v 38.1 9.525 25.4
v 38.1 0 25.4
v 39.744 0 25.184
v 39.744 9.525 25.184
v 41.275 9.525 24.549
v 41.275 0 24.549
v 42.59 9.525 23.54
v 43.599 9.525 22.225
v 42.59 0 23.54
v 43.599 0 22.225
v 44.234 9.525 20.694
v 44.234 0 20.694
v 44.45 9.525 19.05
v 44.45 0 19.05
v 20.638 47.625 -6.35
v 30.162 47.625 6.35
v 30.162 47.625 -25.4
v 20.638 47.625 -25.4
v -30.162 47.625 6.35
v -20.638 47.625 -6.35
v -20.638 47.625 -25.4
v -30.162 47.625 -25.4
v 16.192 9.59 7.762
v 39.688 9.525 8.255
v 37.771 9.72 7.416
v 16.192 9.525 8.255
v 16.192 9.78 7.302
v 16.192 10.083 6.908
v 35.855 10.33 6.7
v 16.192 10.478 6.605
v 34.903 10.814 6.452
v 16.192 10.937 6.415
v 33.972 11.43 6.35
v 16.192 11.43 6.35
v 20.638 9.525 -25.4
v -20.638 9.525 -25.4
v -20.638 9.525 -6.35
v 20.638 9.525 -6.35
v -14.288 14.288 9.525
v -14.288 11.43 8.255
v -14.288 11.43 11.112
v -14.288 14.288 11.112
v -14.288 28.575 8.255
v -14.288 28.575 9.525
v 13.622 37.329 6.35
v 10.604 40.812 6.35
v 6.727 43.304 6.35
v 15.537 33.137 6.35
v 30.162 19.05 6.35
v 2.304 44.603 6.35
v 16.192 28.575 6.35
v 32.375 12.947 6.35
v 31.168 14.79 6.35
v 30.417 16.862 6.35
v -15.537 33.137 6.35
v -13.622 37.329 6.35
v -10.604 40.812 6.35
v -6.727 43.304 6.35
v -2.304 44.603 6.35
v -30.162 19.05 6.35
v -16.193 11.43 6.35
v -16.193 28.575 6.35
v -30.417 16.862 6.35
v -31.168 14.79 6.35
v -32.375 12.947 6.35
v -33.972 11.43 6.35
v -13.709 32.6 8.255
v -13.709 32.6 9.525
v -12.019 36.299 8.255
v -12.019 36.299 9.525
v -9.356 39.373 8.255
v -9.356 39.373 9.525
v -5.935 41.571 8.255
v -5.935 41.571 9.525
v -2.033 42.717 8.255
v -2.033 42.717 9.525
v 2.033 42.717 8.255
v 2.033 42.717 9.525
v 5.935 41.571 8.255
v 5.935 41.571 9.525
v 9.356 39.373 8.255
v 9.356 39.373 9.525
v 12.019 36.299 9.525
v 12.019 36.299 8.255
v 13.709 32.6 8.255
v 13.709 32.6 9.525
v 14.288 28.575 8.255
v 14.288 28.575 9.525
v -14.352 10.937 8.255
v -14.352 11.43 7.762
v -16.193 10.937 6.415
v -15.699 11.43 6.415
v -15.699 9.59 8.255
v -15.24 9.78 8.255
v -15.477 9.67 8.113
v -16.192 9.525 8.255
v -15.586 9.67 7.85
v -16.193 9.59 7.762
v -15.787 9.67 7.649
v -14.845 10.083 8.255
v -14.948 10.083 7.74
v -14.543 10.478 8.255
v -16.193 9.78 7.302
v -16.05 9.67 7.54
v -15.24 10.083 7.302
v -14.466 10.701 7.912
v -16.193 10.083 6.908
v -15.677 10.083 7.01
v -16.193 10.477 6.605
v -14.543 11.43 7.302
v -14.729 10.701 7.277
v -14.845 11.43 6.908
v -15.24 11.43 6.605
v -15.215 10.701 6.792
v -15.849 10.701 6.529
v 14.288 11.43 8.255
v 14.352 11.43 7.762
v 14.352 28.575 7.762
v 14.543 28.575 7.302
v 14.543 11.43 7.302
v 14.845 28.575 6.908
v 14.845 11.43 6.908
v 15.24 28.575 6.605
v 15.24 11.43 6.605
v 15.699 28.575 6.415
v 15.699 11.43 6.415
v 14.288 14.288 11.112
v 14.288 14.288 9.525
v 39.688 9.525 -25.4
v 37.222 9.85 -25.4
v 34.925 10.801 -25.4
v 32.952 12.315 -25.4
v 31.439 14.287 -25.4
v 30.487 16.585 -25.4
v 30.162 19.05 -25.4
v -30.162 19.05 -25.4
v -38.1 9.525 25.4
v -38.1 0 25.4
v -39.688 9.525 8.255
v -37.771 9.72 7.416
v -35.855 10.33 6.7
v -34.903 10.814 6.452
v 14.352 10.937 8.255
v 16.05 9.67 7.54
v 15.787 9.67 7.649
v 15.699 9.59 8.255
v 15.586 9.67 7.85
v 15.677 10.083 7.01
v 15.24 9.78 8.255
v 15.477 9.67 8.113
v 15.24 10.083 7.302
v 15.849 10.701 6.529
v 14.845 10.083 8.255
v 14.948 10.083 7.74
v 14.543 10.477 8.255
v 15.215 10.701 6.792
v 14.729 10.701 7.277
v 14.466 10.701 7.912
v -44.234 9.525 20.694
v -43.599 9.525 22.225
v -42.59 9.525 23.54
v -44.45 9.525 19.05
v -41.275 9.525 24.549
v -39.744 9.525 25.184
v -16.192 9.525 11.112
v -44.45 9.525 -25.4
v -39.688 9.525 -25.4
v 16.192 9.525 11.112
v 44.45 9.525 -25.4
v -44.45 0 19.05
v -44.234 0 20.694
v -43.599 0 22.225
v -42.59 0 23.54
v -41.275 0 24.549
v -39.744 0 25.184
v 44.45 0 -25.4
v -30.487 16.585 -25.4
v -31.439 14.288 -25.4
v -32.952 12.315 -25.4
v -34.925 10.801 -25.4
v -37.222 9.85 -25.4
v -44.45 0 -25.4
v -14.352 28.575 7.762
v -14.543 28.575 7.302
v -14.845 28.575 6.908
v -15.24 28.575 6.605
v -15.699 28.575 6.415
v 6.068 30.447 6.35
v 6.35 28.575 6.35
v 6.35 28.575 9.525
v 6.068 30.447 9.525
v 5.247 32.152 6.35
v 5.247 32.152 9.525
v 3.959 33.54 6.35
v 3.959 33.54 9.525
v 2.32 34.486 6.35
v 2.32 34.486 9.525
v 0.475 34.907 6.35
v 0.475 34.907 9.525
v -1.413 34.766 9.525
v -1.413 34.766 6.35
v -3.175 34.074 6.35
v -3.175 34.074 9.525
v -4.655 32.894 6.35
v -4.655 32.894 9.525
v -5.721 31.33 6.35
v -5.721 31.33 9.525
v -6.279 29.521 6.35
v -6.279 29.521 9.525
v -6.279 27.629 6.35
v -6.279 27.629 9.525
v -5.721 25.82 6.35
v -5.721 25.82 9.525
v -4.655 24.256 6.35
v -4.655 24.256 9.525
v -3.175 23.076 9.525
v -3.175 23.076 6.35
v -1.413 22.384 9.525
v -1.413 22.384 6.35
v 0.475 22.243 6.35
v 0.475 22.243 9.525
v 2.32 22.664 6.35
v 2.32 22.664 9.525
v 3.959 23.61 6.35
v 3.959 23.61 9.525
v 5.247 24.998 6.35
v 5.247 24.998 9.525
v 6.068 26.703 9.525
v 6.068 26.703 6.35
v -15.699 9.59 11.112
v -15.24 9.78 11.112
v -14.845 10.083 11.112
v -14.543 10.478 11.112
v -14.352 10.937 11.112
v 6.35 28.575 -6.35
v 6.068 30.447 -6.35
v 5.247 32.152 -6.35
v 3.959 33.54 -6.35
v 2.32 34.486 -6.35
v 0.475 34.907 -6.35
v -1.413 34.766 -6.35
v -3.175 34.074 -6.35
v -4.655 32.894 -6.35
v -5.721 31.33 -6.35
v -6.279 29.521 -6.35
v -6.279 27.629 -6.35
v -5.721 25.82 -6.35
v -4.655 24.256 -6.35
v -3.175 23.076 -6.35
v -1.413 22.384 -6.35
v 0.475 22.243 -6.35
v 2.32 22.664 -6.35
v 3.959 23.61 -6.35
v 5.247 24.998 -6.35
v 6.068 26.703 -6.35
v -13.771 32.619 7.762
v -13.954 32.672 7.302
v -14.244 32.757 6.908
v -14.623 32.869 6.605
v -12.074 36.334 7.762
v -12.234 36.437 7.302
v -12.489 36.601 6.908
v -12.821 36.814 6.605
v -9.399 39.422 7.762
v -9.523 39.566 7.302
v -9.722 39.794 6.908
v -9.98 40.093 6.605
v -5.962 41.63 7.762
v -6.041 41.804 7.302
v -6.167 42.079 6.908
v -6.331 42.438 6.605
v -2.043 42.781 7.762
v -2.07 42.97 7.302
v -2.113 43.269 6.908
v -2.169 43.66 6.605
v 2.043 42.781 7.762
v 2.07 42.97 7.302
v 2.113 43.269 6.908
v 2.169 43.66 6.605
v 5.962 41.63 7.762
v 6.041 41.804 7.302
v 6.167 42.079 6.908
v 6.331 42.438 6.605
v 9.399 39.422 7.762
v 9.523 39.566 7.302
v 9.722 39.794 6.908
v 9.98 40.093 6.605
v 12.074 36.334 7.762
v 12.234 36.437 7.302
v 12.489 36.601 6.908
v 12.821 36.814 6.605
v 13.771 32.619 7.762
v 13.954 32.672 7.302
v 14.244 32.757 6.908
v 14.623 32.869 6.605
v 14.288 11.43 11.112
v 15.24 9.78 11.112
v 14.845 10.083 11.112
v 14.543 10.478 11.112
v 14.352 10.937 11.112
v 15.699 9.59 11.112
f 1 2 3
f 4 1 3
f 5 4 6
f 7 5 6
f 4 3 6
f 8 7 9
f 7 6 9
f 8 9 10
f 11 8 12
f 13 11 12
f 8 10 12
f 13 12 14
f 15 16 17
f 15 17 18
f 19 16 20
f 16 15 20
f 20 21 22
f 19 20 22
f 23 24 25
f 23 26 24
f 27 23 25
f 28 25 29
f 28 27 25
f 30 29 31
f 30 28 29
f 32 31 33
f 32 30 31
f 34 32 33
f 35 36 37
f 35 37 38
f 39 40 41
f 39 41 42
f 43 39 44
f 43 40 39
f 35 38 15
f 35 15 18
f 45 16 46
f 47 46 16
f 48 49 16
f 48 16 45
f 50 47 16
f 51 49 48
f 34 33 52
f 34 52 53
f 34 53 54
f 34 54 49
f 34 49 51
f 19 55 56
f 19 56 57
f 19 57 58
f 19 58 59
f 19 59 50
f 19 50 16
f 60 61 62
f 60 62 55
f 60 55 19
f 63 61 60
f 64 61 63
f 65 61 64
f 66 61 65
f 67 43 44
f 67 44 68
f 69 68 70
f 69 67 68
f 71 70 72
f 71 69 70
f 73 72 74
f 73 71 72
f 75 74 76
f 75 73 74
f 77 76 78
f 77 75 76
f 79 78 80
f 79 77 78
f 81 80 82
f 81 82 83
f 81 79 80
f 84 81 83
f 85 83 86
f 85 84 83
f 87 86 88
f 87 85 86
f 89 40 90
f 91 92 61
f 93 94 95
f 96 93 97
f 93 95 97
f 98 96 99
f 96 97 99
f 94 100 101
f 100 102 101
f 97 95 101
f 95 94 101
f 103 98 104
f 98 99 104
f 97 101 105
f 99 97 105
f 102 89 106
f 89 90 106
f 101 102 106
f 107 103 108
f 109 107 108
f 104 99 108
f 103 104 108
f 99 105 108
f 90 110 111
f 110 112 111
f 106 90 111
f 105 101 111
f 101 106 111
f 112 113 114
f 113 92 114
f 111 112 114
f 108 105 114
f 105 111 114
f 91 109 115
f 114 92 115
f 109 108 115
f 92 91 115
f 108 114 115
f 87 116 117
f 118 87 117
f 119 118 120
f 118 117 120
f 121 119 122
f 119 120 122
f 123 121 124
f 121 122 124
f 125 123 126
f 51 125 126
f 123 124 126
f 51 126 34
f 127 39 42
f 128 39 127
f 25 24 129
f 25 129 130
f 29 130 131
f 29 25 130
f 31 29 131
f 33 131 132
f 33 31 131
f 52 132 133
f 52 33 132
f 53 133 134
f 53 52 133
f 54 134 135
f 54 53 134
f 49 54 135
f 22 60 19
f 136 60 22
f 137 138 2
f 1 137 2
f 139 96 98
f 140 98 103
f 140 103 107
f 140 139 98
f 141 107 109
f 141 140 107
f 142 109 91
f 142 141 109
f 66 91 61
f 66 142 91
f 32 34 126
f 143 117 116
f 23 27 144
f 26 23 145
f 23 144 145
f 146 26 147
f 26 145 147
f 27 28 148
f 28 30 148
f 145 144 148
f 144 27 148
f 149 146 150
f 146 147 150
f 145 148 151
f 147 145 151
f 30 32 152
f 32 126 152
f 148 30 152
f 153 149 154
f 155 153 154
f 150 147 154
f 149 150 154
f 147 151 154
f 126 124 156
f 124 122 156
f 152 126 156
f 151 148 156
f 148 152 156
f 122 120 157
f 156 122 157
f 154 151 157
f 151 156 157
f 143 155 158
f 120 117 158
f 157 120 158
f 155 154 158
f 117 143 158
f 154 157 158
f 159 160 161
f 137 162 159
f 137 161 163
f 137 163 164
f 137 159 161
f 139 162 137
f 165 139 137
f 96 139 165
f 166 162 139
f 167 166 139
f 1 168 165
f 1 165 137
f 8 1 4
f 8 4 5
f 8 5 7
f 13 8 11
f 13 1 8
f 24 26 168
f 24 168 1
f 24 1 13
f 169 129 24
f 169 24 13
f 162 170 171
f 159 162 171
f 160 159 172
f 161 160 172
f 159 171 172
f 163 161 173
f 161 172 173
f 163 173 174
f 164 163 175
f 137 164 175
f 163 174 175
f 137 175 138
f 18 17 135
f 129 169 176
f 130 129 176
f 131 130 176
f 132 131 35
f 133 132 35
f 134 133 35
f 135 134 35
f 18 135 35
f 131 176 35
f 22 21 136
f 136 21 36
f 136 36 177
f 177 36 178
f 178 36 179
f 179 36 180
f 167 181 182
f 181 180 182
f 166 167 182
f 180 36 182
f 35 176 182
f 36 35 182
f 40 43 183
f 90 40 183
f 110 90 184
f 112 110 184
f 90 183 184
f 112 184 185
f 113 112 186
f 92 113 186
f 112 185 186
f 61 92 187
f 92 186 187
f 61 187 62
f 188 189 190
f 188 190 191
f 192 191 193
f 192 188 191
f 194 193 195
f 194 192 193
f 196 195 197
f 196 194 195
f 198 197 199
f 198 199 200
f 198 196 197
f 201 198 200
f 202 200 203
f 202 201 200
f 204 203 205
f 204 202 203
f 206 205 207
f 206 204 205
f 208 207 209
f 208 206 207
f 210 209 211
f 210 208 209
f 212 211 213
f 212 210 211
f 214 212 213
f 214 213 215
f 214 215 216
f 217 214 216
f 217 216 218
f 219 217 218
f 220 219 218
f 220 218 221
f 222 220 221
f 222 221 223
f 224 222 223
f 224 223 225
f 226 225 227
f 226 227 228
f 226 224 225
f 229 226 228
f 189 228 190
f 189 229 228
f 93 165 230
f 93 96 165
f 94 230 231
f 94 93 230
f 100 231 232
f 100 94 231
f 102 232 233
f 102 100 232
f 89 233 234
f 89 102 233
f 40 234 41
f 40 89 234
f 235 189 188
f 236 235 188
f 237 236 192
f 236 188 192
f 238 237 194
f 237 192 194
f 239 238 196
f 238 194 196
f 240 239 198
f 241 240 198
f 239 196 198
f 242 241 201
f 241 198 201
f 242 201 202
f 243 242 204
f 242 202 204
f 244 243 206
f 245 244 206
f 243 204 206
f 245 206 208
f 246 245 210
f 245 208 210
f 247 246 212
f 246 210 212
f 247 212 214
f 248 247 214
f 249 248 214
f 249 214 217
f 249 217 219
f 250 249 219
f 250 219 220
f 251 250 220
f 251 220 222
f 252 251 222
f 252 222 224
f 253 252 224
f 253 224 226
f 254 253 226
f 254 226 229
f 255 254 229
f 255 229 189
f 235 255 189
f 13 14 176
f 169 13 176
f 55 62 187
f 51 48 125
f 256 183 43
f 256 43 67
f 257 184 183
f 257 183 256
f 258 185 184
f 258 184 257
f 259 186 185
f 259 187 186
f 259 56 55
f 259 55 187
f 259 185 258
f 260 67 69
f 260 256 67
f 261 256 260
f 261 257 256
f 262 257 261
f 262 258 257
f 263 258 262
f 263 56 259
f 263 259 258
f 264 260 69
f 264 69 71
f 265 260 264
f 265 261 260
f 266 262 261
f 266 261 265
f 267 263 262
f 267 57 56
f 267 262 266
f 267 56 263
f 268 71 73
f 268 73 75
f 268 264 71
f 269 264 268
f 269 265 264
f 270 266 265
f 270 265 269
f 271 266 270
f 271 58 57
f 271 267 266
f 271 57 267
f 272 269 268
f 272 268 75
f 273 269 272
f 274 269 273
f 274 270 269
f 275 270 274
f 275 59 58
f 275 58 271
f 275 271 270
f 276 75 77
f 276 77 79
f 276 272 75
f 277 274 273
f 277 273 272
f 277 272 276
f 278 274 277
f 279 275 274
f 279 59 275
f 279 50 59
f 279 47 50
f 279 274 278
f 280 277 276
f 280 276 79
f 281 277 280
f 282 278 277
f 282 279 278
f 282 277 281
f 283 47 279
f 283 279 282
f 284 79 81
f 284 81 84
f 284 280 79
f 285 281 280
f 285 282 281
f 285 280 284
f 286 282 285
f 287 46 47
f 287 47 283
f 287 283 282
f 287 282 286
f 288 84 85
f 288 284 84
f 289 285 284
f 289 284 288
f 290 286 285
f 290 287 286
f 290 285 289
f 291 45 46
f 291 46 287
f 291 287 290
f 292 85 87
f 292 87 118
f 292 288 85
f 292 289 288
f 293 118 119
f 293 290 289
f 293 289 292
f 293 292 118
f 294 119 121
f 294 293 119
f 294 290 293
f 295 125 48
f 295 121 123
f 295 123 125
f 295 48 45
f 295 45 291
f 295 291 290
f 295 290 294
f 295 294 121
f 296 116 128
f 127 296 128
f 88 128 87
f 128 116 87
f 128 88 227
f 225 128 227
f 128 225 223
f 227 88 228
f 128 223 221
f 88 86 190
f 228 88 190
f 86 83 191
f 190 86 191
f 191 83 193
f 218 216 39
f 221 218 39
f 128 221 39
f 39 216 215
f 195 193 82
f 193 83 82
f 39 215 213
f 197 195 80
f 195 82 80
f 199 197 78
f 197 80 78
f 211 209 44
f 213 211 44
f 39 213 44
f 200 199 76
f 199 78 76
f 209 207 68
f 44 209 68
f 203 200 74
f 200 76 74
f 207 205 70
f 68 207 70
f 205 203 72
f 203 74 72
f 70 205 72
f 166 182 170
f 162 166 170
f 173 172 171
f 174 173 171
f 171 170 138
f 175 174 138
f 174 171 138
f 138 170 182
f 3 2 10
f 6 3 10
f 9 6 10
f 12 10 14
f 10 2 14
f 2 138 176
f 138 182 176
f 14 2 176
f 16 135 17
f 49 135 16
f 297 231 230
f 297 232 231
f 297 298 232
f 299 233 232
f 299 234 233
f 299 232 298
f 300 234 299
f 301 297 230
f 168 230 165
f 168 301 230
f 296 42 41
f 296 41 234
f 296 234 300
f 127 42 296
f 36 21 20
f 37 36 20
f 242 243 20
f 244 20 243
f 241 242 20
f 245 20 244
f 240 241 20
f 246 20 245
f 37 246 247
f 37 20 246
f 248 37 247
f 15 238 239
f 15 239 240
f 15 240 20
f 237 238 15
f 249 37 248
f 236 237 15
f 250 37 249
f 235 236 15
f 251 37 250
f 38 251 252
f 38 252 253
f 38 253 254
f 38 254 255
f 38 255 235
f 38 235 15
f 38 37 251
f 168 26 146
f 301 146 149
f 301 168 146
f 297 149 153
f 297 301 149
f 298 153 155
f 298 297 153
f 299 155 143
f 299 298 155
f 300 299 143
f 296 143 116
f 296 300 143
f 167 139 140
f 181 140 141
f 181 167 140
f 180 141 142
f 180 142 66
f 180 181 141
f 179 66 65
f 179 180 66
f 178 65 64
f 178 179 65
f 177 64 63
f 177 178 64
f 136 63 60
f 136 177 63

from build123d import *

# Parameters (mm, degrees)
BOSS_EXTRUDE2_DEPTH  = 9.525
BOSS_EXTRUDE4_DEPTH  = 38.1
SKETCH5_R            = 6.35
BOSS_EXTRUDE6_DEPTH  = 3.175
SKETCH5_6_W          = 28.575
SKETCH5_6_H          = 4.7625
BOSS_EXTRUDE10_DEPTH = 4.7625
SKETCH5_7_R          = 6.35
CUT_EXTRUDE1_DEPTH   = 73.470722537
FILLET1_R            = 9.525
FILLET4_R            = 1.905
FILLET5_R            = 1.905


with BuildPart() as part:
    # Sketch1 → Boss-Extrude2 (new body)
    with BuildSketch(Plane(origin=(0, 0, 0), x_dir=(1, 0, 0), z_dir=(0, 1, 0))):
        with BuildLine():
            Line((-38.1, -25.4), (38.1, -25.4))
            ThreePointArc((38.1, -25.4), (42.590128061, -23.540128061), (44.45, -19.05))
            Line((44.45, -19.05), (44.45, 25.4))
            Line((44.45, 25.4), (-44.45, 25.4))
            Line((-44.45, 25.4), (-44.45, -19.05))
            ThreePointArc((-44.45, -19.05), (-42.590128061, -23.540128061), (-38.1, -25.4))
        make_face()
    extrude(amount=BOSS_EXTRUDE2_DEPTH)

    # Sketch4 → Boss-Extrude4 (add)
    with BuildSketch(Plane(origin=(0, 9.525, 0), x_dir=(1, 0, 0), z_dir=(0, 1, 0))):
        Polygon((30.1625, 25.4), (30.1625, -6.35), (-30.1625, -6.35), (-30.1625, 25.4), (-20.6375, 25.4), (-20.6375, 6.35), (20.6375, 6.35), (20.6375, 25.4), align=None)
    extrude(amount=BOSS_EXTRUDE4_DEPTH)

    # Sketch5 → Boss-Extrude6 (add)
    with BuildSketch(Plane.XY.offset(6.35)):
        with BuildLine():
            Line((-14.2875, 28.575), (-14.2875, 14.2875))
            Line((-14.2875, 14.2875), (14.2875, 14.2875))
            Line((14.2875, 14.2875), (14.2875, 28.575))
            ThreePointArc((14.2875, 28.575), (0, 42.8625), (-14.2875, 28.575))
        make_face()
        with Locations((0, 28.575)):
            Circle(SKETCH5_R, mode=Mode.SUBTRACT)
    extrude(amount=BOSS_EXTRUDE6_DEPTH)

    # Sketch5<6> → Boss-Extrude10 (add)
    with BuildSketch(Plane.XY.offset(6.35)):
        with Locations((0, 11.90625)):
            Rectangle(SKETCH5_6_W, SKETCH5_6_H)
    extrude(amount=BOSS_EXTRUDE10_DEPTH)

    # Sketch5<7> → Cut-Extrude1 (cut, through all)
    with BuildSketch(Plane.XY.offset(6.35)):
        with Locations((0, 28.575)):
            Circle(SKETCH5_7_R)
    extrude(amount=-CUT_EXTRUDE1_DEPTH, mode=Mode.SUBTRACT)

    # Fillet1
    fillet1_edges = [part.edges().sort_by_distance(p)[0] for p in [
        (-30.1625, 9.525, -9.525),
        (30.1625, 9.525, -9.525),
    ]]
    fillet(fillet1_edges, radius=FILLET1_R)

    # Fillet4
    fillet4_edges = [part.edges().sort_by_distance(p)[0] for p in [
        (14.2875, 19.05, 6.35),
        (-14.2875, 19.05, 6.35),
        (0, 42.8625, 6.35),
    ]]
    fillet(fillet4_edges, radius=FILLET4_R)

    # Fillet5
    fillet5_edges = [part.edges().sort_by_distance(p)[0] for p in [
        (-14.2875, 9.525, 9.68375),
        (-14.845461582, 9.525, 6.907961582),
        (14.2875, 9.525, 9.68375),
        (14.845461582, 9.525, 6.907961582),
        (-27.94, 9.525, 6.35),
        (27.94, 9.525, 6.35),
    ]]
    fillet(fillet5_edges, radius=FILLET5_R)


solid = part.part
